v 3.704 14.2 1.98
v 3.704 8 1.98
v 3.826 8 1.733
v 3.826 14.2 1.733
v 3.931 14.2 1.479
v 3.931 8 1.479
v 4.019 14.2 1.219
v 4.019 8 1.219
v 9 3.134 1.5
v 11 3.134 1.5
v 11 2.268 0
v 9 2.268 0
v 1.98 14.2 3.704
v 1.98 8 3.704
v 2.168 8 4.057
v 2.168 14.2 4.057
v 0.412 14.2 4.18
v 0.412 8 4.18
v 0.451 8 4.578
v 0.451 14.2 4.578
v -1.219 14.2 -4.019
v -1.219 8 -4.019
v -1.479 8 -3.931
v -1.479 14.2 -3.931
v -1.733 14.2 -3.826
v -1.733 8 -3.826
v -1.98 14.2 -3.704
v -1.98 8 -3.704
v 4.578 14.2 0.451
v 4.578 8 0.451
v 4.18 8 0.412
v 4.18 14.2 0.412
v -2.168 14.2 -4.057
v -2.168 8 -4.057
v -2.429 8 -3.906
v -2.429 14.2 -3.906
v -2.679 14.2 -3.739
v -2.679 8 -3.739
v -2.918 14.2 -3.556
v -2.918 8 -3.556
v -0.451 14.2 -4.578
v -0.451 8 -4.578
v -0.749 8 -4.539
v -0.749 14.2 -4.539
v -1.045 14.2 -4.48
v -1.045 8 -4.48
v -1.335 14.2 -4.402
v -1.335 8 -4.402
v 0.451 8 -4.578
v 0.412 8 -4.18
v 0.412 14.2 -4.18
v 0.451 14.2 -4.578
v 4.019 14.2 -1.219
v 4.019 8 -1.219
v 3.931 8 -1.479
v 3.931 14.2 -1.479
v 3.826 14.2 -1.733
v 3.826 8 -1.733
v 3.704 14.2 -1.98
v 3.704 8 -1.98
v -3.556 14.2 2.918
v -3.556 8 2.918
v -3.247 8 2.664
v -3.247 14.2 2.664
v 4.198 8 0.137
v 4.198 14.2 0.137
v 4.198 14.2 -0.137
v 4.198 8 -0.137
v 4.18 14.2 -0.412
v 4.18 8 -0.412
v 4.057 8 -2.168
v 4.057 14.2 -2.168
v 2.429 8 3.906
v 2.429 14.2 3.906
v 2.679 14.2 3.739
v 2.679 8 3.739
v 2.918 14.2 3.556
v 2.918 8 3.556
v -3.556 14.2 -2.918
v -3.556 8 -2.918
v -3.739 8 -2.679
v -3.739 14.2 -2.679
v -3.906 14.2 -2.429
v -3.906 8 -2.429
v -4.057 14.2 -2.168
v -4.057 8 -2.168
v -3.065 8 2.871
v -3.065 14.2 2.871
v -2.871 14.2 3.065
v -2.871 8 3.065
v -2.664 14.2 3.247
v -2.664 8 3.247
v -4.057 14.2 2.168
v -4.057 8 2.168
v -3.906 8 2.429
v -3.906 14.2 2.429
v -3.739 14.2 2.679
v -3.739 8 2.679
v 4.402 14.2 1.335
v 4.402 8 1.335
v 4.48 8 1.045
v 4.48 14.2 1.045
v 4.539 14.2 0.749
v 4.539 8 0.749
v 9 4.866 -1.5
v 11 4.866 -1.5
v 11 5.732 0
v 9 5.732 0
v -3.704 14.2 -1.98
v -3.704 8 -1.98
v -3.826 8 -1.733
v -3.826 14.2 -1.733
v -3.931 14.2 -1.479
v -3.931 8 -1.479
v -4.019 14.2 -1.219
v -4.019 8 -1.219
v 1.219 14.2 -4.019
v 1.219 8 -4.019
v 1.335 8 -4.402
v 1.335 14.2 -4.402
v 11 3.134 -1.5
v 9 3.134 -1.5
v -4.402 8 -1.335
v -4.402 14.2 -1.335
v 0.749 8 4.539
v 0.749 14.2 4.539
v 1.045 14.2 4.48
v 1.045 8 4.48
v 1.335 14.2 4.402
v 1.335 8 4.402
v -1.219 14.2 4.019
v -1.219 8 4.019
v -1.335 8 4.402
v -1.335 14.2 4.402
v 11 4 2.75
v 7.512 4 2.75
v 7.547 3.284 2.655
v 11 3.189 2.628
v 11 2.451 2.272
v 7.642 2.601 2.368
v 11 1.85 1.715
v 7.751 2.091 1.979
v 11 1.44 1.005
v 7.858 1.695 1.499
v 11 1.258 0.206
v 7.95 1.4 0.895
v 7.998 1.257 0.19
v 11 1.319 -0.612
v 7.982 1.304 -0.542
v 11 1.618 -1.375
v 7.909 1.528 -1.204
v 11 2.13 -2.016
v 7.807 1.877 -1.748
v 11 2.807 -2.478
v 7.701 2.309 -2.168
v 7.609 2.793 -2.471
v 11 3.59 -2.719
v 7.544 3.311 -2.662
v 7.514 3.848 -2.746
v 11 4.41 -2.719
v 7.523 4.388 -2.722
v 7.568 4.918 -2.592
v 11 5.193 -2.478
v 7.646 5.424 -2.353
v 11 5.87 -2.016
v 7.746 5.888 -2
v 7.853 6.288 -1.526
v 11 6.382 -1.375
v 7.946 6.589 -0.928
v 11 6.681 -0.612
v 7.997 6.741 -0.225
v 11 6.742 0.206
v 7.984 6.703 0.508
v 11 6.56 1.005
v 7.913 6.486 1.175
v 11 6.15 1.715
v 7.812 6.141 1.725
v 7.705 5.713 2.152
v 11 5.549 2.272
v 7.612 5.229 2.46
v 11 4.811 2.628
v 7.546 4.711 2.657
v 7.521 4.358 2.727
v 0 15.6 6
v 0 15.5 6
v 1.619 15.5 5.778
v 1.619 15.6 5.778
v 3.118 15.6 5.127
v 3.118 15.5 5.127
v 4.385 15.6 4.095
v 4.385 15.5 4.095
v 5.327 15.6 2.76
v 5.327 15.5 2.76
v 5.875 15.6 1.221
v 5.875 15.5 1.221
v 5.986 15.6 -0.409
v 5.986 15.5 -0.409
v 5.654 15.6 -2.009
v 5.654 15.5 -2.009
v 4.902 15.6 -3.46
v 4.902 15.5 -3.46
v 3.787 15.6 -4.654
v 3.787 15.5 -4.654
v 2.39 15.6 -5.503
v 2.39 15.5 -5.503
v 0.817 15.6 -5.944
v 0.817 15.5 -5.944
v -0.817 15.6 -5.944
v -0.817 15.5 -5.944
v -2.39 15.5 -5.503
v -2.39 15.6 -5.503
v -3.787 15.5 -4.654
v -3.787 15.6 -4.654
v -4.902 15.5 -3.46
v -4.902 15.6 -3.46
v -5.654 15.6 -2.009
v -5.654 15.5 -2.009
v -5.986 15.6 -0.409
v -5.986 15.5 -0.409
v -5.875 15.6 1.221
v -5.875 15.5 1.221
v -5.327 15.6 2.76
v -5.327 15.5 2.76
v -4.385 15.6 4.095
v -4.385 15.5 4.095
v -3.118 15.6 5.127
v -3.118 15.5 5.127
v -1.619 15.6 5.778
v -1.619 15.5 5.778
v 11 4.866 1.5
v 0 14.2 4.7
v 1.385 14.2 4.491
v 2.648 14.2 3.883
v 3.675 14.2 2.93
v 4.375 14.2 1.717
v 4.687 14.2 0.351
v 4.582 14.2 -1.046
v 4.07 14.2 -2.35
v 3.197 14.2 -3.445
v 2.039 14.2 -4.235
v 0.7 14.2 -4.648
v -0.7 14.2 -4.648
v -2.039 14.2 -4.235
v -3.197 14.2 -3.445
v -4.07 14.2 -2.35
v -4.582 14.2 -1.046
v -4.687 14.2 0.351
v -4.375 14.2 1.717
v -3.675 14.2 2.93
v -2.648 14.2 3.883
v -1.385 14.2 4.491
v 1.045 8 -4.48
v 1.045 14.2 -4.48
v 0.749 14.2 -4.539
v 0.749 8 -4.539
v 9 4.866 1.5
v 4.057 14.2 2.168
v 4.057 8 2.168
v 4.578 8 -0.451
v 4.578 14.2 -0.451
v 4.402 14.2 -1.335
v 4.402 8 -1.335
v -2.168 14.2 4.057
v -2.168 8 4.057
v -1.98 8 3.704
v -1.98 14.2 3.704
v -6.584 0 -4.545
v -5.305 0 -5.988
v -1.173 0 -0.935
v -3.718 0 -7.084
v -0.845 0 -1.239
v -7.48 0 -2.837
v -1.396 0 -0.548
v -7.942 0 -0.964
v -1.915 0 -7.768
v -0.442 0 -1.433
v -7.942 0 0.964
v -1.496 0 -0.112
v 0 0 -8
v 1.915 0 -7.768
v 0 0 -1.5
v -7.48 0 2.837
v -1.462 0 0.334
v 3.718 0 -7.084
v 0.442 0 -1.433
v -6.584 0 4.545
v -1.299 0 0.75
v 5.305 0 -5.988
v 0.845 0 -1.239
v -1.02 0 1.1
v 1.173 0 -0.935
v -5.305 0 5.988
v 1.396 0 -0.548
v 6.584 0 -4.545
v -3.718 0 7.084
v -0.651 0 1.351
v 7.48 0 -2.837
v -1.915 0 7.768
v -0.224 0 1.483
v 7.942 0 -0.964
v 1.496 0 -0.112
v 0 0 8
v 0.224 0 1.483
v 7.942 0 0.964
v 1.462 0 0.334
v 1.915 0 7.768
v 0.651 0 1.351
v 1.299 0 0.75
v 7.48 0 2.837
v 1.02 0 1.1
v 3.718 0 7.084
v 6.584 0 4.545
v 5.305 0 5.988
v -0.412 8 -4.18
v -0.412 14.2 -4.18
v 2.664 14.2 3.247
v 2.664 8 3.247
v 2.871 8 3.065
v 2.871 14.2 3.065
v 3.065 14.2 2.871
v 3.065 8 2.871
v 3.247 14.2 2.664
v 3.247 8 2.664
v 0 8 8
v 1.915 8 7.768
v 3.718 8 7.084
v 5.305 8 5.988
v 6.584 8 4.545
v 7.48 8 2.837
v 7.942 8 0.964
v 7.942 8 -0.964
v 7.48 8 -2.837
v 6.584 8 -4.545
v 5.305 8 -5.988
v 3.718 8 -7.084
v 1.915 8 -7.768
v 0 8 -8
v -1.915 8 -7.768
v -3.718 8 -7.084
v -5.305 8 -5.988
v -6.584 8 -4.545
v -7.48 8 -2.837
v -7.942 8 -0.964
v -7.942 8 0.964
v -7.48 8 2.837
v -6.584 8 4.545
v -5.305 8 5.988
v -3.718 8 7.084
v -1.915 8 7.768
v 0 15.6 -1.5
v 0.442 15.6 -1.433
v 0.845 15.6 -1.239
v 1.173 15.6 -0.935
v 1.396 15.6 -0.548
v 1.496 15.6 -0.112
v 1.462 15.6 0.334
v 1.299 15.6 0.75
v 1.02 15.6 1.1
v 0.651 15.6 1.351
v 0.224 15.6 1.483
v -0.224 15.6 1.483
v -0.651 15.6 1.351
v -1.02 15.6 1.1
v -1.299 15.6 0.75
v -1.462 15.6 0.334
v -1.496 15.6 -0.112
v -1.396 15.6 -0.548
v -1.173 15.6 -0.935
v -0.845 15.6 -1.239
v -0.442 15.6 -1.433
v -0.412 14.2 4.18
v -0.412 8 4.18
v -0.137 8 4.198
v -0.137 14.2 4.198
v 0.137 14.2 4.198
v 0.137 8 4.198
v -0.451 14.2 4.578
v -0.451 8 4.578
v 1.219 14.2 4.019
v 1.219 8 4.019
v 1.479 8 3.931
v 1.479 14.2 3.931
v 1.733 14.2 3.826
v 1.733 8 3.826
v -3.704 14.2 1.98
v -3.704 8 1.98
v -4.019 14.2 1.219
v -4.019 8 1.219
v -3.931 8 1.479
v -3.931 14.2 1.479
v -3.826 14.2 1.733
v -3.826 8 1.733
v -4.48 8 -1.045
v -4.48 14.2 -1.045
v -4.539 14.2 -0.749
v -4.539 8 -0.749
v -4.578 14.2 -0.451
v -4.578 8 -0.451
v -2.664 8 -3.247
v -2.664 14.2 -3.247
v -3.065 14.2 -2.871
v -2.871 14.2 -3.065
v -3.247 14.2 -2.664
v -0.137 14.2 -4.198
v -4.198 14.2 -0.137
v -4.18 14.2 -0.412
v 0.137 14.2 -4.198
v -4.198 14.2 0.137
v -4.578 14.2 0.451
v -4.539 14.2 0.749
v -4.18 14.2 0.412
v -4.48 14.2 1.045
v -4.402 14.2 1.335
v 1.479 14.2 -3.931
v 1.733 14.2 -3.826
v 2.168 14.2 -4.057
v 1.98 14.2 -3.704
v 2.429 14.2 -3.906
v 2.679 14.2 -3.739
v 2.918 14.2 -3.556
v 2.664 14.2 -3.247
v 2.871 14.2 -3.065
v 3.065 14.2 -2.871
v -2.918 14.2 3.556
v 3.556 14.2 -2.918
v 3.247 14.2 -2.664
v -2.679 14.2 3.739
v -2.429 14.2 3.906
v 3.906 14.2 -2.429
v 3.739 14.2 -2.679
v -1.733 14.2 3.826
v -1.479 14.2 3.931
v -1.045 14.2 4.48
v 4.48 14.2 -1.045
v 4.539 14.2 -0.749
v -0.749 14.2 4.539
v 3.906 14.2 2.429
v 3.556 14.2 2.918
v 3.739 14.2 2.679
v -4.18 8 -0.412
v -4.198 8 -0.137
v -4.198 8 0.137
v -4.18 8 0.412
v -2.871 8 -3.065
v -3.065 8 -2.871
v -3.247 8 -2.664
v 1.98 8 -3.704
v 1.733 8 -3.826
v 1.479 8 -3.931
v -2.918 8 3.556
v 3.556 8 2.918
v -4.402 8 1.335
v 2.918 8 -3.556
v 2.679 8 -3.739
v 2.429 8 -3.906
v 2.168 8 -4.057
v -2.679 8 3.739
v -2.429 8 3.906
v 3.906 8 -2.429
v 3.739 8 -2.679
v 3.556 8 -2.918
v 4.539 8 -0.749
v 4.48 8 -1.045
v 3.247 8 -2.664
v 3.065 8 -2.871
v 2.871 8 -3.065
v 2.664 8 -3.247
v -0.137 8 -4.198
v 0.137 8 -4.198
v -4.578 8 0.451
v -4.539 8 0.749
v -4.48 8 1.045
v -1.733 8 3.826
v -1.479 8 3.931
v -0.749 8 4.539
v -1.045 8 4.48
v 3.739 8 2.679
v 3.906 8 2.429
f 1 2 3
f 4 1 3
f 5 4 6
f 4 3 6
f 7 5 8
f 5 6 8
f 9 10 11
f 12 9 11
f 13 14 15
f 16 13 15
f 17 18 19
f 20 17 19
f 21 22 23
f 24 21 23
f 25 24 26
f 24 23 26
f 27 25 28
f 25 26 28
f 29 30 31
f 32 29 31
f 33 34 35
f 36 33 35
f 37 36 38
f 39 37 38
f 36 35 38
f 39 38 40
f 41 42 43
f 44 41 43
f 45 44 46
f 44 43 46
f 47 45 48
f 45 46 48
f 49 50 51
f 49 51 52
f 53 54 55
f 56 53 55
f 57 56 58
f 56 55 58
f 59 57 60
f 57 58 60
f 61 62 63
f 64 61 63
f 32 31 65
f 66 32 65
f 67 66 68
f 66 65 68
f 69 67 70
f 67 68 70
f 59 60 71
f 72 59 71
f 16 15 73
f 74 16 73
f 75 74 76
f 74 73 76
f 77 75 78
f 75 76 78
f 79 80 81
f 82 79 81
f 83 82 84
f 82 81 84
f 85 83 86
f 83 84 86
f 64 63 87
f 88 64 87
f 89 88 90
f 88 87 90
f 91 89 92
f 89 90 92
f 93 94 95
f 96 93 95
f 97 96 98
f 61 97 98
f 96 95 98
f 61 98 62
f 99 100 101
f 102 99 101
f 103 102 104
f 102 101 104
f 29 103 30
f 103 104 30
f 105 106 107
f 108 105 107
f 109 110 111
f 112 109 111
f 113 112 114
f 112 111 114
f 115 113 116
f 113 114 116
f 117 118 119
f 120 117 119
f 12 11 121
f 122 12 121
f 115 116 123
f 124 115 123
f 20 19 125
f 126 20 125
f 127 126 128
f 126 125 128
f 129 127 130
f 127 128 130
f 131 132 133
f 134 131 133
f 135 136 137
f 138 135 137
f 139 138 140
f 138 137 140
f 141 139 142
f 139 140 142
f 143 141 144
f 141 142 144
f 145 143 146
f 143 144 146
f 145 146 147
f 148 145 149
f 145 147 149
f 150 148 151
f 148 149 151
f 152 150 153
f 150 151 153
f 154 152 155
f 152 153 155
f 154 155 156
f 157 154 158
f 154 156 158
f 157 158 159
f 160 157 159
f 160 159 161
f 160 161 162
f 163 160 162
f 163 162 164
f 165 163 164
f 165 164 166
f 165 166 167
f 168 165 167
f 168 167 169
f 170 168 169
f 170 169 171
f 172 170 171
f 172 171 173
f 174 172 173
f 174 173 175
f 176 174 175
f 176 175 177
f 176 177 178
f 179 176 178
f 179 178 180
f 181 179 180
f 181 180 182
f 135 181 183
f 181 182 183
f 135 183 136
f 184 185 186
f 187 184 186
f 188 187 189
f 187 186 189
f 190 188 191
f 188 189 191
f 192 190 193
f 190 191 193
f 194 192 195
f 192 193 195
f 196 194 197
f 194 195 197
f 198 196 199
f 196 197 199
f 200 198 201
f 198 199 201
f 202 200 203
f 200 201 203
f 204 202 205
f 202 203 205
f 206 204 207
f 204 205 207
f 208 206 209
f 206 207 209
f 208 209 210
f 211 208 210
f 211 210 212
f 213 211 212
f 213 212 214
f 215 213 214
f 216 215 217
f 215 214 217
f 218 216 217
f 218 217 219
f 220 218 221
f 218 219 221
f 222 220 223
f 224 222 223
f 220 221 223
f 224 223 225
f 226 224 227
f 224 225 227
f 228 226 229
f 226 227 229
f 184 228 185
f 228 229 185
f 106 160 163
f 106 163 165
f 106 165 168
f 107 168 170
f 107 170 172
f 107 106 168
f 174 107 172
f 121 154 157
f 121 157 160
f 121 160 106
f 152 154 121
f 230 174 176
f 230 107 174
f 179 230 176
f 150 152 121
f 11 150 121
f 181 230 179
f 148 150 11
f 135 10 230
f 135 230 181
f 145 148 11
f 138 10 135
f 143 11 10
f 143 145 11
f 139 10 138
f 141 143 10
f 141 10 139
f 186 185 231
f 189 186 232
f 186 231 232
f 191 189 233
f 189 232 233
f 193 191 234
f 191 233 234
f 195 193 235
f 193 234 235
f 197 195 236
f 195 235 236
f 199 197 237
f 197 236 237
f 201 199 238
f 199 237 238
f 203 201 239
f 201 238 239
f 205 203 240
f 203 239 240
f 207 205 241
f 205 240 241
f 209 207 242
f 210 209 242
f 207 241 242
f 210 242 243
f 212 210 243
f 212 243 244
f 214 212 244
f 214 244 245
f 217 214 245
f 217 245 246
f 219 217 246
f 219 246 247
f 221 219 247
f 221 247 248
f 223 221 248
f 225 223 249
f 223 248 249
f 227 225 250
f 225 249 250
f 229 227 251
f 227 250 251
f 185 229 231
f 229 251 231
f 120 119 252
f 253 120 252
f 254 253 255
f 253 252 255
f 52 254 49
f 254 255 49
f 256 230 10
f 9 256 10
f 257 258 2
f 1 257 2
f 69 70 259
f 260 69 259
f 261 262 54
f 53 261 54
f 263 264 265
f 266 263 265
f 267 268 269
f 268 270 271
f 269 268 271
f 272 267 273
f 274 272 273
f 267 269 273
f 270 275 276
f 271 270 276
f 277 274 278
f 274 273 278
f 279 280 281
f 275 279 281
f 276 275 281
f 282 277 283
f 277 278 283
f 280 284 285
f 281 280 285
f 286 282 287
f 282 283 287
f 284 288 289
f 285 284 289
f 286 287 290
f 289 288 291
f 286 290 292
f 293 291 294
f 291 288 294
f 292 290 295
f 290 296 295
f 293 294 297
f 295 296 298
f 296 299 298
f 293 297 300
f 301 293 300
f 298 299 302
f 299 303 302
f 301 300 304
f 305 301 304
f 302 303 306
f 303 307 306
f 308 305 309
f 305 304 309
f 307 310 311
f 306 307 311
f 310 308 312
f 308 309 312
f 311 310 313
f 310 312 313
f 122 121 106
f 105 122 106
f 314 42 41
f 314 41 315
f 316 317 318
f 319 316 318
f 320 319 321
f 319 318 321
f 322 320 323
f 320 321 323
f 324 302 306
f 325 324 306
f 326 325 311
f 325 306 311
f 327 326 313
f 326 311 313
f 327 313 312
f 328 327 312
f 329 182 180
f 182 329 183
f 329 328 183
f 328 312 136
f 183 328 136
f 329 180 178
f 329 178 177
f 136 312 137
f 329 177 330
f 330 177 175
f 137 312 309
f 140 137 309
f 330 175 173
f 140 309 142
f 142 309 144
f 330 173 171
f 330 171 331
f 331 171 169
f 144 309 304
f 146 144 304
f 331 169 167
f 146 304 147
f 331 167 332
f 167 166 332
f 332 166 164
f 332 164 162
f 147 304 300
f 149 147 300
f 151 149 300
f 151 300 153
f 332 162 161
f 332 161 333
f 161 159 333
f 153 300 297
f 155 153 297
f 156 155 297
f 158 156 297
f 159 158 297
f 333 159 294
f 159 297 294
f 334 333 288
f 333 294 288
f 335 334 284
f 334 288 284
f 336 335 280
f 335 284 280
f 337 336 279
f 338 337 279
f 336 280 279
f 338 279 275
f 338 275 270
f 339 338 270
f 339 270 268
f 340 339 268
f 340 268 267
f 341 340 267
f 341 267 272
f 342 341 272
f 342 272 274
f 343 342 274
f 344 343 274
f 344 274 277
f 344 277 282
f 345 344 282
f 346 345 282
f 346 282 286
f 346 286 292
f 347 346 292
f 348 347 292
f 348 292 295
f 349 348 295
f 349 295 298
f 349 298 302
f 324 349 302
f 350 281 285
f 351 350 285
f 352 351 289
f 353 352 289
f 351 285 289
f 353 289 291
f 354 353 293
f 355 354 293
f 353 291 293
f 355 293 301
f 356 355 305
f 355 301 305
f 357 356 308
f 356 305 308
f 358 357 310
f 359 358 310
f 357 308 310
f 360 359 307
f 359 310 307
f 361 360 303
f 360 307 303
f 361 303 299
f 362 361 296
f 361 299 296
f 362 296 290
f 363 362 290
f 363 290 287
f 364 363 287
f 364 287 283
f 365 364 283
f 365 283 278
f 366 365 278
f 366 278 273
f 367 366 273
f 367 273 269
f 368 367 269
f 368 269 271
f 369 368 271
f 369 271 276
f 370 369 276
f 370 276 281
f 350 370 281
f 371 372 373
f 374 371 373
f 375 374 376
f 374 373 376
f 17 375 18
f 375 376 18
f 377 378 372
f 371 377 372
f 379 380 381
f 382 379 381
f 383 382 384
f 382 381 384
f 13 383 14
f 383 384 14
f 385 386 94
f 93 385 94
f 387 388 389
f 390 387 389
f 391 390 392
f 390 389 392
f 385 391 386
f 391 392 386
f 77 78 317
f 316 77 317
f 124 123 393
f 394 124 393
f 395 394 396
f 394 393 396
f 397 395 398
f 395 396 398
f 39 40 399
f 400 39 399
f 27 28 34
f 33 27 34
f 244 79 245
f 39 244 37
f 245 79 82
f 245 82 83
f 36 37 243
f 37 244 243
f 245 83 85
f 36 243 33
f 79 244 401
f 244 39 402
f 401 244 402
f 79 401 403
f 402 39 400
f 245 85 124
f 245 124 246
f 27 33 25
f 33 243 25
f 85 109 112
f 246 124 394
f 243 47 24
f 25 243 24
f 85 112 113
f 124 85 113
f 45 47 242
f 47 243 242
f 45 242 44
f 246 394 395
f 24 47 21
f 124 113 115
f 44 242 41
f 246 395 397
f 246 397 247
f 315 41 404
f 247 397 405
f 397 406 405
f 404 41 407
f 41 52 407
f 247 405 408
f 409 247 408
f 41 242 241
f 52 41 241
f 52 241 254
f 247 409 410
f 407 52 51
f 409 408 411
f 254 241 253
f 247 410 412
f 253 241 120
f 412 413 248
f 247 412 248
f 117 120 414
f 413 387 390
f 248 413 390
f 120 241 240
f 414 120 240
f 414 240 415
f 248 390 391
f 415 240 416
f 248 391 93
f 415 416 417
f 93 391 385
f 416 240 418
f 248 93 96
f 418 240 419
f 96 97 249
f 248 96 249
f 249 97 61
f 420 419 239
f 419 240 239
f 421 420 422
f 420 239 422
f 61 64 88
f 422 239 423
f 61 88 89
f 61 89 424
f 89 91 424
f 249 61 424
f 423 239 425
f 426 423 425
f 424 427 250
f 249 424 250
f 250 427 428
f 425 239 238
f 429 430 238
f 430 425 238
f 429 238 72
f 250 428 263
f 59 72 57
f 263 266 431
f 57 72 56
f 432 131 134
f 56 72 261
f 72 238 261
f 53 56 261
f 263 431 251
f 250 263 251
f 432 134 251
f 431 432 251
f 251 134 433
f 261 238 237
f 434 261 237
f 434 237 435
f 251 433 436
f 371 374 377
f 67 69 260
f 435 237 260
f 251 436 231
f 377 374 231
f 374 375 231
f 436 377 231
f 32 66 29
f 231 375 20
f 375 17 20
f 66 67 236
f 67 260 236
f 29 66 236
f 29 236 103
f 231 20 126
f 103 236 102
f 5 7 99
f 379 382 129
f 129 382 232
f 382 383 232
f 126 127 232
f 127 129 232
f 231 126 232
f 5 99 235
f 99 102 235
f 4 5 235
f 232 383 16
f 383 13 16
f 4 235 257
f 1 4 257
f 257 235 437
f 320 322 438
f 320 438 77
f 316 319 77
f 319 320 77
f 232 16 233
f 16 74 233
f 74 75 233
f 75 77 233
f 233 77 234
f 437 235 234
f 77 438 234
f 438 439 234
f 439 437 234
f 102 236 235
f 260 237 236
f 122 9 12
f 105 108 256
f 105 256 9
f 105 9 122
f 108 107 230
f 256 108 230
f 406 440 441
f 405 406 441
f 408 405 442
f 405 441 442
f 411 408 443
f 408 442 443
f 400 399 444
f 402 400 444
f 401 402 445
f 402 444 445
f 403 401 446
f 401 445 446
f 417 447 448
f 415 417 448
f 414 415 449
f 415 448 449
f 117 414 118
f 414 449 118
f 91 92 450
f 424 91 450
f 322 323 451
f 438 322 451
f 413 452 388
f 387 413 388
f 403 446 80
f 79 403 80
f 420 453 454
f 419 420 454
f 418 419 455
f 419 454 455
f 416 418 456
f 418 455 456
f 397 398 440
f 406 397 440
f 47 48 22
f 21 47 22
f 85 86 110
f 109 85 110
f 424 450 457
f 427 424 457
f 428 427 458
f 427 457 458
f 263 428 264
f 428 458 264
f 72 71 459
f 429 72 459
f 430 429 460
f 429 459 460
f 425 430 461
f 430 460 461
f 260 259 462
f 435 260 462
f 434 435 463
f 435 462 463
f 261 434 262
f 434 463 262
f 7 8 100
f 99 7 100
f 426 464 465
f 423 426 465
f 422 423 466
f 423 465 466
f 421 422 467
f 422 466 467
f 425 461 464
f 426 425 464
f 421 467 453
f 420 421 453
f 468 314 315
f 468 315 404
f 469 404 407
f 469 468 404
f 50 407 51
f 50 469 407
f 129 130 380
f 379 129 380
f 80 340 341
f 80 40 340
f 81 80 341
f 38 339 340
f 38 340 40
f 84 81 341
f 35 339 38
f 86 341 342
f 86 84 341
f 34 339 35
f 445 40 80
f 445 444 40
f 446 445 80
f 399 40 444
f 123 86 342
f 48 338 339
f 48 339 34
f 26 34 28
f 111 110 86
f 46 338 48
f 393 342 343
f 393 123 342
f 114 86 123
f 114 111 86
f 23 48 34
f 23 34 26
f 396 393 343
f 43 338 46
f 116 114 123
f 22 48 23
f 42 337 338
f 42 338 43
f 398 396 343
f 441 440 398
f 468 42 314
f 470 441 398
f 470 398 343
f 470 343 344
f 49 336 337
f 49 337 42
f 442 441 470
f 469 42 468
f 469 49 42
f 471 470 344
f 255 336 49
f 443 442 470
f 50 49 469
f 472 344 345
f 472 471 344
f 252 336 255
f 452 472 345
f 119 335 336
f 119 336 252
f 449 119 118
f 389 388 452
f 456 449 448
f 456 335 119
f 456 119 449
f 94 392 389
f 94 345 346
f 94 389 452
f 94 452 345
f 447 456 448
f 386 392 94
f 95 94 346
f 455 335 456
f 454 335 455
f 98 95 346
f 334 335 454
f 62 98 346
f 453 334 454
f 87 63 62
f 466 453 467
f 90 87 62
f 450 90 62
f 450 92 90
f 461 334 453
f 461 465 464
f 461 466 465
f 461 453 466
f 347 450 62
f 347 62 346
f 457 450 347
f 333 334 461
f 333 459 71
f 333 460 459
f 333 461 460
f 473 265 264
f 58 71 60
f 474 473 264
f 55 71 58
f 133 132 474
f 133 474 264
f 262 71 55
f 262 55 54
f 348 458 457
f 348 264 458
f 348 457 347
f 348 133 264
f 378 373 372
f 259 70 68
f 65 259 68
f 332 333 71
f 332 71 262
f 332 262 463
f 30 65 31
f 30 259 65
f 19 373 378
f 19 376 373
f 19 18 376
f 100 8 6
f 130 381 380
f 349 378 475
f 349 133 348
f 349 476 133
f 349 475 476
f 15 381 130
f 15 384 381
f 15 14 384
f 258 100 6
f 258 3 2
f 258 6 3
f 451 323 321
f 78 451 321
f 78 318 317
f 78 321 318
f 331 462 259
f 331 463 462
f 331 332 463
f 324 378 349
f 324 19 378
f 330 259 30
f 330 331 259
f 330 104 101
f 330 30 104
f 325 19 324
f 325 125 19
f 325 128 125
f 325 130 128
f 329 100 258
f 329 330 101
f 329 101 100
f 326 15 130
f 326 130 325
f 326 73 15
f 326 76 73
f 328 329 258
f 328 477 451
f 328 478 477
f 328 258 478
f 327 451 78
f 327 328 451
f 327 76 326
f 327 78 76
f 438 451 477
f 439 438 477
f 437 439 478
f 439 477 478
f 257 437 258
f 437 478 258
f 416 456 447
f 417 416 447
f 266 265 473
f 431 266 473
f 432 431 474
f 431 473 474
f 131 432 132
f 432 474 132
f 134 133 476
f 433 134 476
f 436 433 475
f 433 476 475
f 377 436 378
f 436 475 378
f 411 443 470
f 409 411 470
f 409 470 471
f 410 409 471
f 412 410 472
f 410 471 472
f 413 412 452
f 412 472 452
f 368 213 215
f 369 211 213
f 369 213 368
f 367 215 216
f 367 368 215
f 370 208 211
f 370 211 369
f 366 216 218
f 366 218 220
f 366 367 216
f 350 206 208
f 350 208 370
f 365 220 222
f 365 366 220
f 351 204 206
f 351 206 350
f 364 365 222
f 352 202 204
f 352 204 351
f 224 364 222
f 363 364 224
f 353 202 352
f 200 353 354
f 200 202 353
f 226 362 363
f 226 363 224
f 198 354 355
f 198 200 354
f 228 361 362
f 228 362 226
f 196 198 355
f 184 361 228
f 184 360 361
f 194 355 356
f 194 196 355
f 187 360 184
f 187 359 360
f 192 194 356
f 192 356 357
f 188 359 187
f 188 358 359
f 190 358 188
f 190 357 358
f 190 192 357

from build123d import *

# Parameters (mm, degrees)
SKETCH1_R           = 8
BOSS_EXTRUDE1_DEPTH = 8
SKETCH2_R           = 4.6
BOSS_EXTRUDE2_DEPTH = 6.2
CUT_EXTRUDE2_START  = -6.2
CUT_EXTRUDE2_DEPTH  = 6.2
SKETCH3_R           = 6
BOSS_EXTRUDE3_DEPTH = 1.4
CHAMFER1_SIZE       = 1.3
SKETCH4_R           = 2.75
BOSS_EXTRUDE4_DEPTH = 11
CUT_EXTRUDE1_DEPTH  = 2
SKETCH7_R           = 1.5
CUT_EXTRUDE3_DEPTH  = 21.696859757


with BuildPart() as part:
    # Sketch1 → Boss-Extrude1 (new body)
    with BuildSketch(Plane(origin=(0, 0, 0), x_dir=(1, 0, 0), z_dir=(0, 1, 0))):
        with Locations(Location((0, 0, 0), (0, 0, 270))):
            Circle(SKETCH1_R)
    extrude(amount=BOSS_EXTRUDE1_DEPTH)

    # Sketch2 → Boss-Extrude2 (add)
    with BuildSketch(Plane(origin=(0, 8, 0), x_dir=(1, 0, 0), z_dir=(0, 1, 0))):
        with Locations(Location((0, 0, 0), (0, 0, 90))):
            Circle(SKETCH2_R)
    extrude(amount=BOSS_EXTRUDE2_DEPTH)

    # Sketch6 → Cut-Extrude2 (cut)
    with BuildSketch(Plane(origin=(0, 14.2, 0), x_dir=(1, 0, 0), z_dir=(0, 1, 0)).offset(CUT_EXTRUDE2_START)):
        with BuildLine():
            Line((-0.450878846, 4.577849743), (-0.411671989, 4.179775852))
            ThreePointArc((-0.411671989, 4.179775852), (0, 4.2), (0.411671989, 4.179775852))
            Line((0.411671989, 4.179775852), (0.450878846, 4.577849743))
            ThreePointArc((0.450878846, 4.577849743), (0, 4.6), (-0.450878846, 4.577849743))
        make_face()
        with BuildLine():
            Line((2.168424989, 4.056837816), (1.979866295, 3.70406931))
            ThreePointArc((1.979866295, 3.70406931), (1.607270416, 3.880294037), (1.219195644, 4.01914941))
            Line((1.219195644, 4.01914941), (1.335309515, 4.401925544))
            ThreePointArc((1.335309515, 4.401925544), (1.760343789, 4.24984585), (2.168424989, 4.056837816))
        make_face()
        with BuildLine():
            Line((3.555848085, 2.918209107), (3.246643904, 2.664451793))
            ThreePointArc((3.246643904, 2.664451793), (2.969848481, 2.969848481), (2.664451793, 3.246643904))
            Line((2.664451793, 3.246643904), (2.918209107, 3.555848085))
            ThreePointArc((2.918209107, 3.555848085), (3.252691193, 3.252691193), (3.555848085, 2.918209107))
        make_face()
        with BuildLine():
            Line((4.401925544, 1.335309515), (4.01914941, 1.219195644))
            ThreePointArc((4.01914941, 1.219195644), (3.880294037, 1.607270416), (3.70406931, 1.979866295))
            Line((3.70406931, 1.979866295), (4.056837816, 2.168424989))
            ThreePointArc((4.056837816, 2.168424989), (4.24984585, 1.760343789), (4.401925544, 1.335309515))
        make_face()
        with BuildLine():
            Line((4.577849743, -0.450878846), (4.179775852, -0.411671989))
            ThreePointArc((4.179775852, -0.411671989), (4.2, 0), (4.179775852, 0.411671989))
            Line((4.179775852, 0.411671989), (4.577849743, 0.450878846))
            ThreePointArc((4.577849743, 0.450878846), (4.6, 0), (4.577849743, -0.450878846))
        make_face()
        with BuildLine():
            Line((4.056837816, -2.168424989), (3.70406931, -1.979866295))
            ThreePointArc((3.70406931, -1.979866295), (3.880294037, -1.607270416), (4.01914941, -1.219195644))
            Line((4.01914941, -1.219195644), (4.401925544, -1.335309515))
            ThreePointArc((4.401925544, -1.335309515), (4.24984585, -1.760343789), (4.056837816, -2.168424989))
        make_face()
        with BuildLine():
            Line((2.918209107, -3.555848085), (2.664451793, -3.246643904))
            ThreePointArc((2.664451793, -3.246643904), (2.969848481, -2.969848481), (3.246643904, -2.664451793))
            Line((3.246643904, -2.664451793), (3.555848085, -2.918209107))
            ThreePointArc((3.555848085, -2.918209107), (3.252691193, -3.252691193), (2.918209107, -3.555848085))
        make_face()
        with BuildLine():
            Line((1.335309515, -4.401925544), (1.219195644, -4.01914941))
            ThreePointArc((1.219195644, -4.01914941), (1.607270416, -3.880294037), (1.979866295, -3.70406931))
            Line((1.979866295, -3.70406931), (2.168424989, -4.056837816))
            ThreePointArc((2.168424989, -4.056837816), (1.760343789, -4.24984585), (1.335309515, -4.401925544))
        make_face()
        with BuildLine():
            Line((-0.450878846, -4.577849743), (-0.411671989, -4.179775852))
            ThreePointArc((-0.411671989, -4.179775852), (0, -4.2), (0.411671989, -4.179775852))
            Line((0.411671989, -4.179775852), (0.450878846, -4.577849743))
            ThreePointArc((0.450878846, -4.577849743), (0, -4.6), (-0.450878846, -4.577849743))
        make_face()
        with BuildLine():
            Line((-2.168424989, -4.056837816), (-1.979866295, -3.70406931))
            ThreePointArc((-1.979866295, -3.70406931), (-1.607270416, -3.880294037), (-1.219195644, -4.01914941))
            Line((-1.219195644, -4.01914941), (-1.335309515, -4.401925544))
            ThreePointArc((-1.335309515, -4.401925544), (-1.760343789, -4.24984585), (-2.168424989, -4.056837816))
        make_face()
        with BuildLine():
            Line((-3.555848085, -2.918209107), (-3.246643904, -2.664451793))
            ThreePointArc((-3.246643904, -2.664451793), (-2.969848481, -2.969848481), (-2.664451793, -3.246643904))
            Line((-2.664451793, -3.246643904), (-2.918209107, -3.555848085))
            ThreePointArc((-2.918209107, -3.555848085), (-3.252691193, -3.252691193), (-3.555848085, -2.918209107))
        make_face()
        with BuildLine():
            Line((-4.401925544, -1.335309515), (-4.01914941, -1.219195644))
            ThreePointArc((-4.01914941, -1.219195644), (-3.880294037, -1.607270416), (-3.70406931, -1.979866295))
            Line((-3.70406931, -1.979866295), (-4.056837816, -2.168424989))
            ThreePointArc((-4.056837816, -2.168424989), (-4.24984585, -1.760343789), (-4.401925544, -1.335309515))
        make_face()
        with BuildLine():
            Line((-4.577849743, 0.450878846), (-4.179775852, 0.411671989))
            ThreePointArc((-4.179775852, 0.411671989), (-4.2, 0), (-4.179775852, -0.411671989))
            Line((-4.179775852, -0.411671989), (-4.577849743, -0.450878846))
            ThreePointArc((-4.577849743, -0.450878846), (-4.6, 0), (-4.577849743, 0.450878846))
        make_face()
        with BuildLine():
            Line((-4.056837816, 2.168424989), (-3.70406931, 1.979866295))
            ThreePointArc((-3.70406931, 1.979866295), (-3.880294037, 1.607270416), (-4.01914941, 1.219195644))
            Line((-4.01914941, 1.219195644), (-4.401925544, 1.335309515))
            ThreePointArc((-4.401925544, 1.335309515), (-4.24984585, 1.760343789), (-4.056837816, 2.168424989))
        make_face()
        with BuildLine():
            Line((-2.918209107, 3.555848085), (-2.664451793, 3.246643904))
            ThreePointArc((-2.664451793, 3.246643904), (-2.969848481, 2.969848481), (-3.246643904, 2.664451793))
            Line((-3.246643904, 2.664451793), (-3.555848085, 2.918209107))
            ThreePointArc((-3.555848085, 2.918209107), (-3.252691193, 3.252691193), (-2.918209107, 3.555848085))
        make_face()
        with BuildLine():
            Line((-1.335309515, 4.401925544), (-1.219195644, 4.01914941))
            ThreePointArc((-1.219195644, 4.01914941), (-1.607270416, 3.880294037), (-1.979866295, 3.70406931))
            Line((-1.979866295, 3.70406931), (-2.168424989, 4.056837816))
            ThreePointArc((-2.168424989, 4.056837816), (-1.760343789, 4.24984585), (-1.335309515, 4.401925544))
        make_face()
    extrude(amount=CUT_EXTRUDE2_DEPTH, mode=Mode.SUBTRACT)

    # Sketch3 → Boss-Extrude3 (add)
    with BuildSketch(Plane(origin=(0, 14.2, 0), x_dir=(1, 0, 0), z_dir=(0, 1, 0))):
        with Locations(Location((0, 0, 0), (0, 0, 270))):
            Circle(SKETCH3_R)
    extrude(amount=BOSS_EXTRUDE3_DEPTH)

    # Chamfer1
    chamfer1_edges = [part.edges().sort_by_distance(p)[0] for p in [
        (0, 14.2, -6),
    ]]
    chamfer(chamfer1_edges, length=CHAMFER1_SIZE)

    # Sketch4 → Boss-Extrude4 (add)
    with BuildSketch(Plane(origin=(0, 0, 0), x_dir=(0, 0, -1), z_dir=(1, 0, 0))):
        with Locations(Location((0, 4, 0), (0, 0, 180))):
            Circle(SKETCH4_R)
    extrude(amount=BOSS_EXTRUDE4_DEPTH)

    # Sketch5 → Cut-Extrude1 (cut)
    with BuildSketch(Plane(origin=(11, 0, 0), x_dir=(0, 0, -1), z_dir=(1, 0, 0))):
        Polygon((0, 2.267949192), (1.5, 3.133974596), (1.5, 4.866025404), (0, 5.732050808), (-1.5, 4.866025404), (-1.5, 3.133974596), align=None)
    extrude(amount=-CUT_EXTRUDE1_DEPTH, mode=Mode.SUBTRACT)

    # Sketch7 → Cut-Extrude3 (cut, through all)
    with BuildSketch(Plane.XZ):
        with Locations(Location((0, 0, 0), (0, 0, 270))):
            Circle(SKETCH7_R)
    extrude(amount=-CUT_EXTRUDE3_DEPTH, mode=Mode.SUBTRACT)


solid = part.part
